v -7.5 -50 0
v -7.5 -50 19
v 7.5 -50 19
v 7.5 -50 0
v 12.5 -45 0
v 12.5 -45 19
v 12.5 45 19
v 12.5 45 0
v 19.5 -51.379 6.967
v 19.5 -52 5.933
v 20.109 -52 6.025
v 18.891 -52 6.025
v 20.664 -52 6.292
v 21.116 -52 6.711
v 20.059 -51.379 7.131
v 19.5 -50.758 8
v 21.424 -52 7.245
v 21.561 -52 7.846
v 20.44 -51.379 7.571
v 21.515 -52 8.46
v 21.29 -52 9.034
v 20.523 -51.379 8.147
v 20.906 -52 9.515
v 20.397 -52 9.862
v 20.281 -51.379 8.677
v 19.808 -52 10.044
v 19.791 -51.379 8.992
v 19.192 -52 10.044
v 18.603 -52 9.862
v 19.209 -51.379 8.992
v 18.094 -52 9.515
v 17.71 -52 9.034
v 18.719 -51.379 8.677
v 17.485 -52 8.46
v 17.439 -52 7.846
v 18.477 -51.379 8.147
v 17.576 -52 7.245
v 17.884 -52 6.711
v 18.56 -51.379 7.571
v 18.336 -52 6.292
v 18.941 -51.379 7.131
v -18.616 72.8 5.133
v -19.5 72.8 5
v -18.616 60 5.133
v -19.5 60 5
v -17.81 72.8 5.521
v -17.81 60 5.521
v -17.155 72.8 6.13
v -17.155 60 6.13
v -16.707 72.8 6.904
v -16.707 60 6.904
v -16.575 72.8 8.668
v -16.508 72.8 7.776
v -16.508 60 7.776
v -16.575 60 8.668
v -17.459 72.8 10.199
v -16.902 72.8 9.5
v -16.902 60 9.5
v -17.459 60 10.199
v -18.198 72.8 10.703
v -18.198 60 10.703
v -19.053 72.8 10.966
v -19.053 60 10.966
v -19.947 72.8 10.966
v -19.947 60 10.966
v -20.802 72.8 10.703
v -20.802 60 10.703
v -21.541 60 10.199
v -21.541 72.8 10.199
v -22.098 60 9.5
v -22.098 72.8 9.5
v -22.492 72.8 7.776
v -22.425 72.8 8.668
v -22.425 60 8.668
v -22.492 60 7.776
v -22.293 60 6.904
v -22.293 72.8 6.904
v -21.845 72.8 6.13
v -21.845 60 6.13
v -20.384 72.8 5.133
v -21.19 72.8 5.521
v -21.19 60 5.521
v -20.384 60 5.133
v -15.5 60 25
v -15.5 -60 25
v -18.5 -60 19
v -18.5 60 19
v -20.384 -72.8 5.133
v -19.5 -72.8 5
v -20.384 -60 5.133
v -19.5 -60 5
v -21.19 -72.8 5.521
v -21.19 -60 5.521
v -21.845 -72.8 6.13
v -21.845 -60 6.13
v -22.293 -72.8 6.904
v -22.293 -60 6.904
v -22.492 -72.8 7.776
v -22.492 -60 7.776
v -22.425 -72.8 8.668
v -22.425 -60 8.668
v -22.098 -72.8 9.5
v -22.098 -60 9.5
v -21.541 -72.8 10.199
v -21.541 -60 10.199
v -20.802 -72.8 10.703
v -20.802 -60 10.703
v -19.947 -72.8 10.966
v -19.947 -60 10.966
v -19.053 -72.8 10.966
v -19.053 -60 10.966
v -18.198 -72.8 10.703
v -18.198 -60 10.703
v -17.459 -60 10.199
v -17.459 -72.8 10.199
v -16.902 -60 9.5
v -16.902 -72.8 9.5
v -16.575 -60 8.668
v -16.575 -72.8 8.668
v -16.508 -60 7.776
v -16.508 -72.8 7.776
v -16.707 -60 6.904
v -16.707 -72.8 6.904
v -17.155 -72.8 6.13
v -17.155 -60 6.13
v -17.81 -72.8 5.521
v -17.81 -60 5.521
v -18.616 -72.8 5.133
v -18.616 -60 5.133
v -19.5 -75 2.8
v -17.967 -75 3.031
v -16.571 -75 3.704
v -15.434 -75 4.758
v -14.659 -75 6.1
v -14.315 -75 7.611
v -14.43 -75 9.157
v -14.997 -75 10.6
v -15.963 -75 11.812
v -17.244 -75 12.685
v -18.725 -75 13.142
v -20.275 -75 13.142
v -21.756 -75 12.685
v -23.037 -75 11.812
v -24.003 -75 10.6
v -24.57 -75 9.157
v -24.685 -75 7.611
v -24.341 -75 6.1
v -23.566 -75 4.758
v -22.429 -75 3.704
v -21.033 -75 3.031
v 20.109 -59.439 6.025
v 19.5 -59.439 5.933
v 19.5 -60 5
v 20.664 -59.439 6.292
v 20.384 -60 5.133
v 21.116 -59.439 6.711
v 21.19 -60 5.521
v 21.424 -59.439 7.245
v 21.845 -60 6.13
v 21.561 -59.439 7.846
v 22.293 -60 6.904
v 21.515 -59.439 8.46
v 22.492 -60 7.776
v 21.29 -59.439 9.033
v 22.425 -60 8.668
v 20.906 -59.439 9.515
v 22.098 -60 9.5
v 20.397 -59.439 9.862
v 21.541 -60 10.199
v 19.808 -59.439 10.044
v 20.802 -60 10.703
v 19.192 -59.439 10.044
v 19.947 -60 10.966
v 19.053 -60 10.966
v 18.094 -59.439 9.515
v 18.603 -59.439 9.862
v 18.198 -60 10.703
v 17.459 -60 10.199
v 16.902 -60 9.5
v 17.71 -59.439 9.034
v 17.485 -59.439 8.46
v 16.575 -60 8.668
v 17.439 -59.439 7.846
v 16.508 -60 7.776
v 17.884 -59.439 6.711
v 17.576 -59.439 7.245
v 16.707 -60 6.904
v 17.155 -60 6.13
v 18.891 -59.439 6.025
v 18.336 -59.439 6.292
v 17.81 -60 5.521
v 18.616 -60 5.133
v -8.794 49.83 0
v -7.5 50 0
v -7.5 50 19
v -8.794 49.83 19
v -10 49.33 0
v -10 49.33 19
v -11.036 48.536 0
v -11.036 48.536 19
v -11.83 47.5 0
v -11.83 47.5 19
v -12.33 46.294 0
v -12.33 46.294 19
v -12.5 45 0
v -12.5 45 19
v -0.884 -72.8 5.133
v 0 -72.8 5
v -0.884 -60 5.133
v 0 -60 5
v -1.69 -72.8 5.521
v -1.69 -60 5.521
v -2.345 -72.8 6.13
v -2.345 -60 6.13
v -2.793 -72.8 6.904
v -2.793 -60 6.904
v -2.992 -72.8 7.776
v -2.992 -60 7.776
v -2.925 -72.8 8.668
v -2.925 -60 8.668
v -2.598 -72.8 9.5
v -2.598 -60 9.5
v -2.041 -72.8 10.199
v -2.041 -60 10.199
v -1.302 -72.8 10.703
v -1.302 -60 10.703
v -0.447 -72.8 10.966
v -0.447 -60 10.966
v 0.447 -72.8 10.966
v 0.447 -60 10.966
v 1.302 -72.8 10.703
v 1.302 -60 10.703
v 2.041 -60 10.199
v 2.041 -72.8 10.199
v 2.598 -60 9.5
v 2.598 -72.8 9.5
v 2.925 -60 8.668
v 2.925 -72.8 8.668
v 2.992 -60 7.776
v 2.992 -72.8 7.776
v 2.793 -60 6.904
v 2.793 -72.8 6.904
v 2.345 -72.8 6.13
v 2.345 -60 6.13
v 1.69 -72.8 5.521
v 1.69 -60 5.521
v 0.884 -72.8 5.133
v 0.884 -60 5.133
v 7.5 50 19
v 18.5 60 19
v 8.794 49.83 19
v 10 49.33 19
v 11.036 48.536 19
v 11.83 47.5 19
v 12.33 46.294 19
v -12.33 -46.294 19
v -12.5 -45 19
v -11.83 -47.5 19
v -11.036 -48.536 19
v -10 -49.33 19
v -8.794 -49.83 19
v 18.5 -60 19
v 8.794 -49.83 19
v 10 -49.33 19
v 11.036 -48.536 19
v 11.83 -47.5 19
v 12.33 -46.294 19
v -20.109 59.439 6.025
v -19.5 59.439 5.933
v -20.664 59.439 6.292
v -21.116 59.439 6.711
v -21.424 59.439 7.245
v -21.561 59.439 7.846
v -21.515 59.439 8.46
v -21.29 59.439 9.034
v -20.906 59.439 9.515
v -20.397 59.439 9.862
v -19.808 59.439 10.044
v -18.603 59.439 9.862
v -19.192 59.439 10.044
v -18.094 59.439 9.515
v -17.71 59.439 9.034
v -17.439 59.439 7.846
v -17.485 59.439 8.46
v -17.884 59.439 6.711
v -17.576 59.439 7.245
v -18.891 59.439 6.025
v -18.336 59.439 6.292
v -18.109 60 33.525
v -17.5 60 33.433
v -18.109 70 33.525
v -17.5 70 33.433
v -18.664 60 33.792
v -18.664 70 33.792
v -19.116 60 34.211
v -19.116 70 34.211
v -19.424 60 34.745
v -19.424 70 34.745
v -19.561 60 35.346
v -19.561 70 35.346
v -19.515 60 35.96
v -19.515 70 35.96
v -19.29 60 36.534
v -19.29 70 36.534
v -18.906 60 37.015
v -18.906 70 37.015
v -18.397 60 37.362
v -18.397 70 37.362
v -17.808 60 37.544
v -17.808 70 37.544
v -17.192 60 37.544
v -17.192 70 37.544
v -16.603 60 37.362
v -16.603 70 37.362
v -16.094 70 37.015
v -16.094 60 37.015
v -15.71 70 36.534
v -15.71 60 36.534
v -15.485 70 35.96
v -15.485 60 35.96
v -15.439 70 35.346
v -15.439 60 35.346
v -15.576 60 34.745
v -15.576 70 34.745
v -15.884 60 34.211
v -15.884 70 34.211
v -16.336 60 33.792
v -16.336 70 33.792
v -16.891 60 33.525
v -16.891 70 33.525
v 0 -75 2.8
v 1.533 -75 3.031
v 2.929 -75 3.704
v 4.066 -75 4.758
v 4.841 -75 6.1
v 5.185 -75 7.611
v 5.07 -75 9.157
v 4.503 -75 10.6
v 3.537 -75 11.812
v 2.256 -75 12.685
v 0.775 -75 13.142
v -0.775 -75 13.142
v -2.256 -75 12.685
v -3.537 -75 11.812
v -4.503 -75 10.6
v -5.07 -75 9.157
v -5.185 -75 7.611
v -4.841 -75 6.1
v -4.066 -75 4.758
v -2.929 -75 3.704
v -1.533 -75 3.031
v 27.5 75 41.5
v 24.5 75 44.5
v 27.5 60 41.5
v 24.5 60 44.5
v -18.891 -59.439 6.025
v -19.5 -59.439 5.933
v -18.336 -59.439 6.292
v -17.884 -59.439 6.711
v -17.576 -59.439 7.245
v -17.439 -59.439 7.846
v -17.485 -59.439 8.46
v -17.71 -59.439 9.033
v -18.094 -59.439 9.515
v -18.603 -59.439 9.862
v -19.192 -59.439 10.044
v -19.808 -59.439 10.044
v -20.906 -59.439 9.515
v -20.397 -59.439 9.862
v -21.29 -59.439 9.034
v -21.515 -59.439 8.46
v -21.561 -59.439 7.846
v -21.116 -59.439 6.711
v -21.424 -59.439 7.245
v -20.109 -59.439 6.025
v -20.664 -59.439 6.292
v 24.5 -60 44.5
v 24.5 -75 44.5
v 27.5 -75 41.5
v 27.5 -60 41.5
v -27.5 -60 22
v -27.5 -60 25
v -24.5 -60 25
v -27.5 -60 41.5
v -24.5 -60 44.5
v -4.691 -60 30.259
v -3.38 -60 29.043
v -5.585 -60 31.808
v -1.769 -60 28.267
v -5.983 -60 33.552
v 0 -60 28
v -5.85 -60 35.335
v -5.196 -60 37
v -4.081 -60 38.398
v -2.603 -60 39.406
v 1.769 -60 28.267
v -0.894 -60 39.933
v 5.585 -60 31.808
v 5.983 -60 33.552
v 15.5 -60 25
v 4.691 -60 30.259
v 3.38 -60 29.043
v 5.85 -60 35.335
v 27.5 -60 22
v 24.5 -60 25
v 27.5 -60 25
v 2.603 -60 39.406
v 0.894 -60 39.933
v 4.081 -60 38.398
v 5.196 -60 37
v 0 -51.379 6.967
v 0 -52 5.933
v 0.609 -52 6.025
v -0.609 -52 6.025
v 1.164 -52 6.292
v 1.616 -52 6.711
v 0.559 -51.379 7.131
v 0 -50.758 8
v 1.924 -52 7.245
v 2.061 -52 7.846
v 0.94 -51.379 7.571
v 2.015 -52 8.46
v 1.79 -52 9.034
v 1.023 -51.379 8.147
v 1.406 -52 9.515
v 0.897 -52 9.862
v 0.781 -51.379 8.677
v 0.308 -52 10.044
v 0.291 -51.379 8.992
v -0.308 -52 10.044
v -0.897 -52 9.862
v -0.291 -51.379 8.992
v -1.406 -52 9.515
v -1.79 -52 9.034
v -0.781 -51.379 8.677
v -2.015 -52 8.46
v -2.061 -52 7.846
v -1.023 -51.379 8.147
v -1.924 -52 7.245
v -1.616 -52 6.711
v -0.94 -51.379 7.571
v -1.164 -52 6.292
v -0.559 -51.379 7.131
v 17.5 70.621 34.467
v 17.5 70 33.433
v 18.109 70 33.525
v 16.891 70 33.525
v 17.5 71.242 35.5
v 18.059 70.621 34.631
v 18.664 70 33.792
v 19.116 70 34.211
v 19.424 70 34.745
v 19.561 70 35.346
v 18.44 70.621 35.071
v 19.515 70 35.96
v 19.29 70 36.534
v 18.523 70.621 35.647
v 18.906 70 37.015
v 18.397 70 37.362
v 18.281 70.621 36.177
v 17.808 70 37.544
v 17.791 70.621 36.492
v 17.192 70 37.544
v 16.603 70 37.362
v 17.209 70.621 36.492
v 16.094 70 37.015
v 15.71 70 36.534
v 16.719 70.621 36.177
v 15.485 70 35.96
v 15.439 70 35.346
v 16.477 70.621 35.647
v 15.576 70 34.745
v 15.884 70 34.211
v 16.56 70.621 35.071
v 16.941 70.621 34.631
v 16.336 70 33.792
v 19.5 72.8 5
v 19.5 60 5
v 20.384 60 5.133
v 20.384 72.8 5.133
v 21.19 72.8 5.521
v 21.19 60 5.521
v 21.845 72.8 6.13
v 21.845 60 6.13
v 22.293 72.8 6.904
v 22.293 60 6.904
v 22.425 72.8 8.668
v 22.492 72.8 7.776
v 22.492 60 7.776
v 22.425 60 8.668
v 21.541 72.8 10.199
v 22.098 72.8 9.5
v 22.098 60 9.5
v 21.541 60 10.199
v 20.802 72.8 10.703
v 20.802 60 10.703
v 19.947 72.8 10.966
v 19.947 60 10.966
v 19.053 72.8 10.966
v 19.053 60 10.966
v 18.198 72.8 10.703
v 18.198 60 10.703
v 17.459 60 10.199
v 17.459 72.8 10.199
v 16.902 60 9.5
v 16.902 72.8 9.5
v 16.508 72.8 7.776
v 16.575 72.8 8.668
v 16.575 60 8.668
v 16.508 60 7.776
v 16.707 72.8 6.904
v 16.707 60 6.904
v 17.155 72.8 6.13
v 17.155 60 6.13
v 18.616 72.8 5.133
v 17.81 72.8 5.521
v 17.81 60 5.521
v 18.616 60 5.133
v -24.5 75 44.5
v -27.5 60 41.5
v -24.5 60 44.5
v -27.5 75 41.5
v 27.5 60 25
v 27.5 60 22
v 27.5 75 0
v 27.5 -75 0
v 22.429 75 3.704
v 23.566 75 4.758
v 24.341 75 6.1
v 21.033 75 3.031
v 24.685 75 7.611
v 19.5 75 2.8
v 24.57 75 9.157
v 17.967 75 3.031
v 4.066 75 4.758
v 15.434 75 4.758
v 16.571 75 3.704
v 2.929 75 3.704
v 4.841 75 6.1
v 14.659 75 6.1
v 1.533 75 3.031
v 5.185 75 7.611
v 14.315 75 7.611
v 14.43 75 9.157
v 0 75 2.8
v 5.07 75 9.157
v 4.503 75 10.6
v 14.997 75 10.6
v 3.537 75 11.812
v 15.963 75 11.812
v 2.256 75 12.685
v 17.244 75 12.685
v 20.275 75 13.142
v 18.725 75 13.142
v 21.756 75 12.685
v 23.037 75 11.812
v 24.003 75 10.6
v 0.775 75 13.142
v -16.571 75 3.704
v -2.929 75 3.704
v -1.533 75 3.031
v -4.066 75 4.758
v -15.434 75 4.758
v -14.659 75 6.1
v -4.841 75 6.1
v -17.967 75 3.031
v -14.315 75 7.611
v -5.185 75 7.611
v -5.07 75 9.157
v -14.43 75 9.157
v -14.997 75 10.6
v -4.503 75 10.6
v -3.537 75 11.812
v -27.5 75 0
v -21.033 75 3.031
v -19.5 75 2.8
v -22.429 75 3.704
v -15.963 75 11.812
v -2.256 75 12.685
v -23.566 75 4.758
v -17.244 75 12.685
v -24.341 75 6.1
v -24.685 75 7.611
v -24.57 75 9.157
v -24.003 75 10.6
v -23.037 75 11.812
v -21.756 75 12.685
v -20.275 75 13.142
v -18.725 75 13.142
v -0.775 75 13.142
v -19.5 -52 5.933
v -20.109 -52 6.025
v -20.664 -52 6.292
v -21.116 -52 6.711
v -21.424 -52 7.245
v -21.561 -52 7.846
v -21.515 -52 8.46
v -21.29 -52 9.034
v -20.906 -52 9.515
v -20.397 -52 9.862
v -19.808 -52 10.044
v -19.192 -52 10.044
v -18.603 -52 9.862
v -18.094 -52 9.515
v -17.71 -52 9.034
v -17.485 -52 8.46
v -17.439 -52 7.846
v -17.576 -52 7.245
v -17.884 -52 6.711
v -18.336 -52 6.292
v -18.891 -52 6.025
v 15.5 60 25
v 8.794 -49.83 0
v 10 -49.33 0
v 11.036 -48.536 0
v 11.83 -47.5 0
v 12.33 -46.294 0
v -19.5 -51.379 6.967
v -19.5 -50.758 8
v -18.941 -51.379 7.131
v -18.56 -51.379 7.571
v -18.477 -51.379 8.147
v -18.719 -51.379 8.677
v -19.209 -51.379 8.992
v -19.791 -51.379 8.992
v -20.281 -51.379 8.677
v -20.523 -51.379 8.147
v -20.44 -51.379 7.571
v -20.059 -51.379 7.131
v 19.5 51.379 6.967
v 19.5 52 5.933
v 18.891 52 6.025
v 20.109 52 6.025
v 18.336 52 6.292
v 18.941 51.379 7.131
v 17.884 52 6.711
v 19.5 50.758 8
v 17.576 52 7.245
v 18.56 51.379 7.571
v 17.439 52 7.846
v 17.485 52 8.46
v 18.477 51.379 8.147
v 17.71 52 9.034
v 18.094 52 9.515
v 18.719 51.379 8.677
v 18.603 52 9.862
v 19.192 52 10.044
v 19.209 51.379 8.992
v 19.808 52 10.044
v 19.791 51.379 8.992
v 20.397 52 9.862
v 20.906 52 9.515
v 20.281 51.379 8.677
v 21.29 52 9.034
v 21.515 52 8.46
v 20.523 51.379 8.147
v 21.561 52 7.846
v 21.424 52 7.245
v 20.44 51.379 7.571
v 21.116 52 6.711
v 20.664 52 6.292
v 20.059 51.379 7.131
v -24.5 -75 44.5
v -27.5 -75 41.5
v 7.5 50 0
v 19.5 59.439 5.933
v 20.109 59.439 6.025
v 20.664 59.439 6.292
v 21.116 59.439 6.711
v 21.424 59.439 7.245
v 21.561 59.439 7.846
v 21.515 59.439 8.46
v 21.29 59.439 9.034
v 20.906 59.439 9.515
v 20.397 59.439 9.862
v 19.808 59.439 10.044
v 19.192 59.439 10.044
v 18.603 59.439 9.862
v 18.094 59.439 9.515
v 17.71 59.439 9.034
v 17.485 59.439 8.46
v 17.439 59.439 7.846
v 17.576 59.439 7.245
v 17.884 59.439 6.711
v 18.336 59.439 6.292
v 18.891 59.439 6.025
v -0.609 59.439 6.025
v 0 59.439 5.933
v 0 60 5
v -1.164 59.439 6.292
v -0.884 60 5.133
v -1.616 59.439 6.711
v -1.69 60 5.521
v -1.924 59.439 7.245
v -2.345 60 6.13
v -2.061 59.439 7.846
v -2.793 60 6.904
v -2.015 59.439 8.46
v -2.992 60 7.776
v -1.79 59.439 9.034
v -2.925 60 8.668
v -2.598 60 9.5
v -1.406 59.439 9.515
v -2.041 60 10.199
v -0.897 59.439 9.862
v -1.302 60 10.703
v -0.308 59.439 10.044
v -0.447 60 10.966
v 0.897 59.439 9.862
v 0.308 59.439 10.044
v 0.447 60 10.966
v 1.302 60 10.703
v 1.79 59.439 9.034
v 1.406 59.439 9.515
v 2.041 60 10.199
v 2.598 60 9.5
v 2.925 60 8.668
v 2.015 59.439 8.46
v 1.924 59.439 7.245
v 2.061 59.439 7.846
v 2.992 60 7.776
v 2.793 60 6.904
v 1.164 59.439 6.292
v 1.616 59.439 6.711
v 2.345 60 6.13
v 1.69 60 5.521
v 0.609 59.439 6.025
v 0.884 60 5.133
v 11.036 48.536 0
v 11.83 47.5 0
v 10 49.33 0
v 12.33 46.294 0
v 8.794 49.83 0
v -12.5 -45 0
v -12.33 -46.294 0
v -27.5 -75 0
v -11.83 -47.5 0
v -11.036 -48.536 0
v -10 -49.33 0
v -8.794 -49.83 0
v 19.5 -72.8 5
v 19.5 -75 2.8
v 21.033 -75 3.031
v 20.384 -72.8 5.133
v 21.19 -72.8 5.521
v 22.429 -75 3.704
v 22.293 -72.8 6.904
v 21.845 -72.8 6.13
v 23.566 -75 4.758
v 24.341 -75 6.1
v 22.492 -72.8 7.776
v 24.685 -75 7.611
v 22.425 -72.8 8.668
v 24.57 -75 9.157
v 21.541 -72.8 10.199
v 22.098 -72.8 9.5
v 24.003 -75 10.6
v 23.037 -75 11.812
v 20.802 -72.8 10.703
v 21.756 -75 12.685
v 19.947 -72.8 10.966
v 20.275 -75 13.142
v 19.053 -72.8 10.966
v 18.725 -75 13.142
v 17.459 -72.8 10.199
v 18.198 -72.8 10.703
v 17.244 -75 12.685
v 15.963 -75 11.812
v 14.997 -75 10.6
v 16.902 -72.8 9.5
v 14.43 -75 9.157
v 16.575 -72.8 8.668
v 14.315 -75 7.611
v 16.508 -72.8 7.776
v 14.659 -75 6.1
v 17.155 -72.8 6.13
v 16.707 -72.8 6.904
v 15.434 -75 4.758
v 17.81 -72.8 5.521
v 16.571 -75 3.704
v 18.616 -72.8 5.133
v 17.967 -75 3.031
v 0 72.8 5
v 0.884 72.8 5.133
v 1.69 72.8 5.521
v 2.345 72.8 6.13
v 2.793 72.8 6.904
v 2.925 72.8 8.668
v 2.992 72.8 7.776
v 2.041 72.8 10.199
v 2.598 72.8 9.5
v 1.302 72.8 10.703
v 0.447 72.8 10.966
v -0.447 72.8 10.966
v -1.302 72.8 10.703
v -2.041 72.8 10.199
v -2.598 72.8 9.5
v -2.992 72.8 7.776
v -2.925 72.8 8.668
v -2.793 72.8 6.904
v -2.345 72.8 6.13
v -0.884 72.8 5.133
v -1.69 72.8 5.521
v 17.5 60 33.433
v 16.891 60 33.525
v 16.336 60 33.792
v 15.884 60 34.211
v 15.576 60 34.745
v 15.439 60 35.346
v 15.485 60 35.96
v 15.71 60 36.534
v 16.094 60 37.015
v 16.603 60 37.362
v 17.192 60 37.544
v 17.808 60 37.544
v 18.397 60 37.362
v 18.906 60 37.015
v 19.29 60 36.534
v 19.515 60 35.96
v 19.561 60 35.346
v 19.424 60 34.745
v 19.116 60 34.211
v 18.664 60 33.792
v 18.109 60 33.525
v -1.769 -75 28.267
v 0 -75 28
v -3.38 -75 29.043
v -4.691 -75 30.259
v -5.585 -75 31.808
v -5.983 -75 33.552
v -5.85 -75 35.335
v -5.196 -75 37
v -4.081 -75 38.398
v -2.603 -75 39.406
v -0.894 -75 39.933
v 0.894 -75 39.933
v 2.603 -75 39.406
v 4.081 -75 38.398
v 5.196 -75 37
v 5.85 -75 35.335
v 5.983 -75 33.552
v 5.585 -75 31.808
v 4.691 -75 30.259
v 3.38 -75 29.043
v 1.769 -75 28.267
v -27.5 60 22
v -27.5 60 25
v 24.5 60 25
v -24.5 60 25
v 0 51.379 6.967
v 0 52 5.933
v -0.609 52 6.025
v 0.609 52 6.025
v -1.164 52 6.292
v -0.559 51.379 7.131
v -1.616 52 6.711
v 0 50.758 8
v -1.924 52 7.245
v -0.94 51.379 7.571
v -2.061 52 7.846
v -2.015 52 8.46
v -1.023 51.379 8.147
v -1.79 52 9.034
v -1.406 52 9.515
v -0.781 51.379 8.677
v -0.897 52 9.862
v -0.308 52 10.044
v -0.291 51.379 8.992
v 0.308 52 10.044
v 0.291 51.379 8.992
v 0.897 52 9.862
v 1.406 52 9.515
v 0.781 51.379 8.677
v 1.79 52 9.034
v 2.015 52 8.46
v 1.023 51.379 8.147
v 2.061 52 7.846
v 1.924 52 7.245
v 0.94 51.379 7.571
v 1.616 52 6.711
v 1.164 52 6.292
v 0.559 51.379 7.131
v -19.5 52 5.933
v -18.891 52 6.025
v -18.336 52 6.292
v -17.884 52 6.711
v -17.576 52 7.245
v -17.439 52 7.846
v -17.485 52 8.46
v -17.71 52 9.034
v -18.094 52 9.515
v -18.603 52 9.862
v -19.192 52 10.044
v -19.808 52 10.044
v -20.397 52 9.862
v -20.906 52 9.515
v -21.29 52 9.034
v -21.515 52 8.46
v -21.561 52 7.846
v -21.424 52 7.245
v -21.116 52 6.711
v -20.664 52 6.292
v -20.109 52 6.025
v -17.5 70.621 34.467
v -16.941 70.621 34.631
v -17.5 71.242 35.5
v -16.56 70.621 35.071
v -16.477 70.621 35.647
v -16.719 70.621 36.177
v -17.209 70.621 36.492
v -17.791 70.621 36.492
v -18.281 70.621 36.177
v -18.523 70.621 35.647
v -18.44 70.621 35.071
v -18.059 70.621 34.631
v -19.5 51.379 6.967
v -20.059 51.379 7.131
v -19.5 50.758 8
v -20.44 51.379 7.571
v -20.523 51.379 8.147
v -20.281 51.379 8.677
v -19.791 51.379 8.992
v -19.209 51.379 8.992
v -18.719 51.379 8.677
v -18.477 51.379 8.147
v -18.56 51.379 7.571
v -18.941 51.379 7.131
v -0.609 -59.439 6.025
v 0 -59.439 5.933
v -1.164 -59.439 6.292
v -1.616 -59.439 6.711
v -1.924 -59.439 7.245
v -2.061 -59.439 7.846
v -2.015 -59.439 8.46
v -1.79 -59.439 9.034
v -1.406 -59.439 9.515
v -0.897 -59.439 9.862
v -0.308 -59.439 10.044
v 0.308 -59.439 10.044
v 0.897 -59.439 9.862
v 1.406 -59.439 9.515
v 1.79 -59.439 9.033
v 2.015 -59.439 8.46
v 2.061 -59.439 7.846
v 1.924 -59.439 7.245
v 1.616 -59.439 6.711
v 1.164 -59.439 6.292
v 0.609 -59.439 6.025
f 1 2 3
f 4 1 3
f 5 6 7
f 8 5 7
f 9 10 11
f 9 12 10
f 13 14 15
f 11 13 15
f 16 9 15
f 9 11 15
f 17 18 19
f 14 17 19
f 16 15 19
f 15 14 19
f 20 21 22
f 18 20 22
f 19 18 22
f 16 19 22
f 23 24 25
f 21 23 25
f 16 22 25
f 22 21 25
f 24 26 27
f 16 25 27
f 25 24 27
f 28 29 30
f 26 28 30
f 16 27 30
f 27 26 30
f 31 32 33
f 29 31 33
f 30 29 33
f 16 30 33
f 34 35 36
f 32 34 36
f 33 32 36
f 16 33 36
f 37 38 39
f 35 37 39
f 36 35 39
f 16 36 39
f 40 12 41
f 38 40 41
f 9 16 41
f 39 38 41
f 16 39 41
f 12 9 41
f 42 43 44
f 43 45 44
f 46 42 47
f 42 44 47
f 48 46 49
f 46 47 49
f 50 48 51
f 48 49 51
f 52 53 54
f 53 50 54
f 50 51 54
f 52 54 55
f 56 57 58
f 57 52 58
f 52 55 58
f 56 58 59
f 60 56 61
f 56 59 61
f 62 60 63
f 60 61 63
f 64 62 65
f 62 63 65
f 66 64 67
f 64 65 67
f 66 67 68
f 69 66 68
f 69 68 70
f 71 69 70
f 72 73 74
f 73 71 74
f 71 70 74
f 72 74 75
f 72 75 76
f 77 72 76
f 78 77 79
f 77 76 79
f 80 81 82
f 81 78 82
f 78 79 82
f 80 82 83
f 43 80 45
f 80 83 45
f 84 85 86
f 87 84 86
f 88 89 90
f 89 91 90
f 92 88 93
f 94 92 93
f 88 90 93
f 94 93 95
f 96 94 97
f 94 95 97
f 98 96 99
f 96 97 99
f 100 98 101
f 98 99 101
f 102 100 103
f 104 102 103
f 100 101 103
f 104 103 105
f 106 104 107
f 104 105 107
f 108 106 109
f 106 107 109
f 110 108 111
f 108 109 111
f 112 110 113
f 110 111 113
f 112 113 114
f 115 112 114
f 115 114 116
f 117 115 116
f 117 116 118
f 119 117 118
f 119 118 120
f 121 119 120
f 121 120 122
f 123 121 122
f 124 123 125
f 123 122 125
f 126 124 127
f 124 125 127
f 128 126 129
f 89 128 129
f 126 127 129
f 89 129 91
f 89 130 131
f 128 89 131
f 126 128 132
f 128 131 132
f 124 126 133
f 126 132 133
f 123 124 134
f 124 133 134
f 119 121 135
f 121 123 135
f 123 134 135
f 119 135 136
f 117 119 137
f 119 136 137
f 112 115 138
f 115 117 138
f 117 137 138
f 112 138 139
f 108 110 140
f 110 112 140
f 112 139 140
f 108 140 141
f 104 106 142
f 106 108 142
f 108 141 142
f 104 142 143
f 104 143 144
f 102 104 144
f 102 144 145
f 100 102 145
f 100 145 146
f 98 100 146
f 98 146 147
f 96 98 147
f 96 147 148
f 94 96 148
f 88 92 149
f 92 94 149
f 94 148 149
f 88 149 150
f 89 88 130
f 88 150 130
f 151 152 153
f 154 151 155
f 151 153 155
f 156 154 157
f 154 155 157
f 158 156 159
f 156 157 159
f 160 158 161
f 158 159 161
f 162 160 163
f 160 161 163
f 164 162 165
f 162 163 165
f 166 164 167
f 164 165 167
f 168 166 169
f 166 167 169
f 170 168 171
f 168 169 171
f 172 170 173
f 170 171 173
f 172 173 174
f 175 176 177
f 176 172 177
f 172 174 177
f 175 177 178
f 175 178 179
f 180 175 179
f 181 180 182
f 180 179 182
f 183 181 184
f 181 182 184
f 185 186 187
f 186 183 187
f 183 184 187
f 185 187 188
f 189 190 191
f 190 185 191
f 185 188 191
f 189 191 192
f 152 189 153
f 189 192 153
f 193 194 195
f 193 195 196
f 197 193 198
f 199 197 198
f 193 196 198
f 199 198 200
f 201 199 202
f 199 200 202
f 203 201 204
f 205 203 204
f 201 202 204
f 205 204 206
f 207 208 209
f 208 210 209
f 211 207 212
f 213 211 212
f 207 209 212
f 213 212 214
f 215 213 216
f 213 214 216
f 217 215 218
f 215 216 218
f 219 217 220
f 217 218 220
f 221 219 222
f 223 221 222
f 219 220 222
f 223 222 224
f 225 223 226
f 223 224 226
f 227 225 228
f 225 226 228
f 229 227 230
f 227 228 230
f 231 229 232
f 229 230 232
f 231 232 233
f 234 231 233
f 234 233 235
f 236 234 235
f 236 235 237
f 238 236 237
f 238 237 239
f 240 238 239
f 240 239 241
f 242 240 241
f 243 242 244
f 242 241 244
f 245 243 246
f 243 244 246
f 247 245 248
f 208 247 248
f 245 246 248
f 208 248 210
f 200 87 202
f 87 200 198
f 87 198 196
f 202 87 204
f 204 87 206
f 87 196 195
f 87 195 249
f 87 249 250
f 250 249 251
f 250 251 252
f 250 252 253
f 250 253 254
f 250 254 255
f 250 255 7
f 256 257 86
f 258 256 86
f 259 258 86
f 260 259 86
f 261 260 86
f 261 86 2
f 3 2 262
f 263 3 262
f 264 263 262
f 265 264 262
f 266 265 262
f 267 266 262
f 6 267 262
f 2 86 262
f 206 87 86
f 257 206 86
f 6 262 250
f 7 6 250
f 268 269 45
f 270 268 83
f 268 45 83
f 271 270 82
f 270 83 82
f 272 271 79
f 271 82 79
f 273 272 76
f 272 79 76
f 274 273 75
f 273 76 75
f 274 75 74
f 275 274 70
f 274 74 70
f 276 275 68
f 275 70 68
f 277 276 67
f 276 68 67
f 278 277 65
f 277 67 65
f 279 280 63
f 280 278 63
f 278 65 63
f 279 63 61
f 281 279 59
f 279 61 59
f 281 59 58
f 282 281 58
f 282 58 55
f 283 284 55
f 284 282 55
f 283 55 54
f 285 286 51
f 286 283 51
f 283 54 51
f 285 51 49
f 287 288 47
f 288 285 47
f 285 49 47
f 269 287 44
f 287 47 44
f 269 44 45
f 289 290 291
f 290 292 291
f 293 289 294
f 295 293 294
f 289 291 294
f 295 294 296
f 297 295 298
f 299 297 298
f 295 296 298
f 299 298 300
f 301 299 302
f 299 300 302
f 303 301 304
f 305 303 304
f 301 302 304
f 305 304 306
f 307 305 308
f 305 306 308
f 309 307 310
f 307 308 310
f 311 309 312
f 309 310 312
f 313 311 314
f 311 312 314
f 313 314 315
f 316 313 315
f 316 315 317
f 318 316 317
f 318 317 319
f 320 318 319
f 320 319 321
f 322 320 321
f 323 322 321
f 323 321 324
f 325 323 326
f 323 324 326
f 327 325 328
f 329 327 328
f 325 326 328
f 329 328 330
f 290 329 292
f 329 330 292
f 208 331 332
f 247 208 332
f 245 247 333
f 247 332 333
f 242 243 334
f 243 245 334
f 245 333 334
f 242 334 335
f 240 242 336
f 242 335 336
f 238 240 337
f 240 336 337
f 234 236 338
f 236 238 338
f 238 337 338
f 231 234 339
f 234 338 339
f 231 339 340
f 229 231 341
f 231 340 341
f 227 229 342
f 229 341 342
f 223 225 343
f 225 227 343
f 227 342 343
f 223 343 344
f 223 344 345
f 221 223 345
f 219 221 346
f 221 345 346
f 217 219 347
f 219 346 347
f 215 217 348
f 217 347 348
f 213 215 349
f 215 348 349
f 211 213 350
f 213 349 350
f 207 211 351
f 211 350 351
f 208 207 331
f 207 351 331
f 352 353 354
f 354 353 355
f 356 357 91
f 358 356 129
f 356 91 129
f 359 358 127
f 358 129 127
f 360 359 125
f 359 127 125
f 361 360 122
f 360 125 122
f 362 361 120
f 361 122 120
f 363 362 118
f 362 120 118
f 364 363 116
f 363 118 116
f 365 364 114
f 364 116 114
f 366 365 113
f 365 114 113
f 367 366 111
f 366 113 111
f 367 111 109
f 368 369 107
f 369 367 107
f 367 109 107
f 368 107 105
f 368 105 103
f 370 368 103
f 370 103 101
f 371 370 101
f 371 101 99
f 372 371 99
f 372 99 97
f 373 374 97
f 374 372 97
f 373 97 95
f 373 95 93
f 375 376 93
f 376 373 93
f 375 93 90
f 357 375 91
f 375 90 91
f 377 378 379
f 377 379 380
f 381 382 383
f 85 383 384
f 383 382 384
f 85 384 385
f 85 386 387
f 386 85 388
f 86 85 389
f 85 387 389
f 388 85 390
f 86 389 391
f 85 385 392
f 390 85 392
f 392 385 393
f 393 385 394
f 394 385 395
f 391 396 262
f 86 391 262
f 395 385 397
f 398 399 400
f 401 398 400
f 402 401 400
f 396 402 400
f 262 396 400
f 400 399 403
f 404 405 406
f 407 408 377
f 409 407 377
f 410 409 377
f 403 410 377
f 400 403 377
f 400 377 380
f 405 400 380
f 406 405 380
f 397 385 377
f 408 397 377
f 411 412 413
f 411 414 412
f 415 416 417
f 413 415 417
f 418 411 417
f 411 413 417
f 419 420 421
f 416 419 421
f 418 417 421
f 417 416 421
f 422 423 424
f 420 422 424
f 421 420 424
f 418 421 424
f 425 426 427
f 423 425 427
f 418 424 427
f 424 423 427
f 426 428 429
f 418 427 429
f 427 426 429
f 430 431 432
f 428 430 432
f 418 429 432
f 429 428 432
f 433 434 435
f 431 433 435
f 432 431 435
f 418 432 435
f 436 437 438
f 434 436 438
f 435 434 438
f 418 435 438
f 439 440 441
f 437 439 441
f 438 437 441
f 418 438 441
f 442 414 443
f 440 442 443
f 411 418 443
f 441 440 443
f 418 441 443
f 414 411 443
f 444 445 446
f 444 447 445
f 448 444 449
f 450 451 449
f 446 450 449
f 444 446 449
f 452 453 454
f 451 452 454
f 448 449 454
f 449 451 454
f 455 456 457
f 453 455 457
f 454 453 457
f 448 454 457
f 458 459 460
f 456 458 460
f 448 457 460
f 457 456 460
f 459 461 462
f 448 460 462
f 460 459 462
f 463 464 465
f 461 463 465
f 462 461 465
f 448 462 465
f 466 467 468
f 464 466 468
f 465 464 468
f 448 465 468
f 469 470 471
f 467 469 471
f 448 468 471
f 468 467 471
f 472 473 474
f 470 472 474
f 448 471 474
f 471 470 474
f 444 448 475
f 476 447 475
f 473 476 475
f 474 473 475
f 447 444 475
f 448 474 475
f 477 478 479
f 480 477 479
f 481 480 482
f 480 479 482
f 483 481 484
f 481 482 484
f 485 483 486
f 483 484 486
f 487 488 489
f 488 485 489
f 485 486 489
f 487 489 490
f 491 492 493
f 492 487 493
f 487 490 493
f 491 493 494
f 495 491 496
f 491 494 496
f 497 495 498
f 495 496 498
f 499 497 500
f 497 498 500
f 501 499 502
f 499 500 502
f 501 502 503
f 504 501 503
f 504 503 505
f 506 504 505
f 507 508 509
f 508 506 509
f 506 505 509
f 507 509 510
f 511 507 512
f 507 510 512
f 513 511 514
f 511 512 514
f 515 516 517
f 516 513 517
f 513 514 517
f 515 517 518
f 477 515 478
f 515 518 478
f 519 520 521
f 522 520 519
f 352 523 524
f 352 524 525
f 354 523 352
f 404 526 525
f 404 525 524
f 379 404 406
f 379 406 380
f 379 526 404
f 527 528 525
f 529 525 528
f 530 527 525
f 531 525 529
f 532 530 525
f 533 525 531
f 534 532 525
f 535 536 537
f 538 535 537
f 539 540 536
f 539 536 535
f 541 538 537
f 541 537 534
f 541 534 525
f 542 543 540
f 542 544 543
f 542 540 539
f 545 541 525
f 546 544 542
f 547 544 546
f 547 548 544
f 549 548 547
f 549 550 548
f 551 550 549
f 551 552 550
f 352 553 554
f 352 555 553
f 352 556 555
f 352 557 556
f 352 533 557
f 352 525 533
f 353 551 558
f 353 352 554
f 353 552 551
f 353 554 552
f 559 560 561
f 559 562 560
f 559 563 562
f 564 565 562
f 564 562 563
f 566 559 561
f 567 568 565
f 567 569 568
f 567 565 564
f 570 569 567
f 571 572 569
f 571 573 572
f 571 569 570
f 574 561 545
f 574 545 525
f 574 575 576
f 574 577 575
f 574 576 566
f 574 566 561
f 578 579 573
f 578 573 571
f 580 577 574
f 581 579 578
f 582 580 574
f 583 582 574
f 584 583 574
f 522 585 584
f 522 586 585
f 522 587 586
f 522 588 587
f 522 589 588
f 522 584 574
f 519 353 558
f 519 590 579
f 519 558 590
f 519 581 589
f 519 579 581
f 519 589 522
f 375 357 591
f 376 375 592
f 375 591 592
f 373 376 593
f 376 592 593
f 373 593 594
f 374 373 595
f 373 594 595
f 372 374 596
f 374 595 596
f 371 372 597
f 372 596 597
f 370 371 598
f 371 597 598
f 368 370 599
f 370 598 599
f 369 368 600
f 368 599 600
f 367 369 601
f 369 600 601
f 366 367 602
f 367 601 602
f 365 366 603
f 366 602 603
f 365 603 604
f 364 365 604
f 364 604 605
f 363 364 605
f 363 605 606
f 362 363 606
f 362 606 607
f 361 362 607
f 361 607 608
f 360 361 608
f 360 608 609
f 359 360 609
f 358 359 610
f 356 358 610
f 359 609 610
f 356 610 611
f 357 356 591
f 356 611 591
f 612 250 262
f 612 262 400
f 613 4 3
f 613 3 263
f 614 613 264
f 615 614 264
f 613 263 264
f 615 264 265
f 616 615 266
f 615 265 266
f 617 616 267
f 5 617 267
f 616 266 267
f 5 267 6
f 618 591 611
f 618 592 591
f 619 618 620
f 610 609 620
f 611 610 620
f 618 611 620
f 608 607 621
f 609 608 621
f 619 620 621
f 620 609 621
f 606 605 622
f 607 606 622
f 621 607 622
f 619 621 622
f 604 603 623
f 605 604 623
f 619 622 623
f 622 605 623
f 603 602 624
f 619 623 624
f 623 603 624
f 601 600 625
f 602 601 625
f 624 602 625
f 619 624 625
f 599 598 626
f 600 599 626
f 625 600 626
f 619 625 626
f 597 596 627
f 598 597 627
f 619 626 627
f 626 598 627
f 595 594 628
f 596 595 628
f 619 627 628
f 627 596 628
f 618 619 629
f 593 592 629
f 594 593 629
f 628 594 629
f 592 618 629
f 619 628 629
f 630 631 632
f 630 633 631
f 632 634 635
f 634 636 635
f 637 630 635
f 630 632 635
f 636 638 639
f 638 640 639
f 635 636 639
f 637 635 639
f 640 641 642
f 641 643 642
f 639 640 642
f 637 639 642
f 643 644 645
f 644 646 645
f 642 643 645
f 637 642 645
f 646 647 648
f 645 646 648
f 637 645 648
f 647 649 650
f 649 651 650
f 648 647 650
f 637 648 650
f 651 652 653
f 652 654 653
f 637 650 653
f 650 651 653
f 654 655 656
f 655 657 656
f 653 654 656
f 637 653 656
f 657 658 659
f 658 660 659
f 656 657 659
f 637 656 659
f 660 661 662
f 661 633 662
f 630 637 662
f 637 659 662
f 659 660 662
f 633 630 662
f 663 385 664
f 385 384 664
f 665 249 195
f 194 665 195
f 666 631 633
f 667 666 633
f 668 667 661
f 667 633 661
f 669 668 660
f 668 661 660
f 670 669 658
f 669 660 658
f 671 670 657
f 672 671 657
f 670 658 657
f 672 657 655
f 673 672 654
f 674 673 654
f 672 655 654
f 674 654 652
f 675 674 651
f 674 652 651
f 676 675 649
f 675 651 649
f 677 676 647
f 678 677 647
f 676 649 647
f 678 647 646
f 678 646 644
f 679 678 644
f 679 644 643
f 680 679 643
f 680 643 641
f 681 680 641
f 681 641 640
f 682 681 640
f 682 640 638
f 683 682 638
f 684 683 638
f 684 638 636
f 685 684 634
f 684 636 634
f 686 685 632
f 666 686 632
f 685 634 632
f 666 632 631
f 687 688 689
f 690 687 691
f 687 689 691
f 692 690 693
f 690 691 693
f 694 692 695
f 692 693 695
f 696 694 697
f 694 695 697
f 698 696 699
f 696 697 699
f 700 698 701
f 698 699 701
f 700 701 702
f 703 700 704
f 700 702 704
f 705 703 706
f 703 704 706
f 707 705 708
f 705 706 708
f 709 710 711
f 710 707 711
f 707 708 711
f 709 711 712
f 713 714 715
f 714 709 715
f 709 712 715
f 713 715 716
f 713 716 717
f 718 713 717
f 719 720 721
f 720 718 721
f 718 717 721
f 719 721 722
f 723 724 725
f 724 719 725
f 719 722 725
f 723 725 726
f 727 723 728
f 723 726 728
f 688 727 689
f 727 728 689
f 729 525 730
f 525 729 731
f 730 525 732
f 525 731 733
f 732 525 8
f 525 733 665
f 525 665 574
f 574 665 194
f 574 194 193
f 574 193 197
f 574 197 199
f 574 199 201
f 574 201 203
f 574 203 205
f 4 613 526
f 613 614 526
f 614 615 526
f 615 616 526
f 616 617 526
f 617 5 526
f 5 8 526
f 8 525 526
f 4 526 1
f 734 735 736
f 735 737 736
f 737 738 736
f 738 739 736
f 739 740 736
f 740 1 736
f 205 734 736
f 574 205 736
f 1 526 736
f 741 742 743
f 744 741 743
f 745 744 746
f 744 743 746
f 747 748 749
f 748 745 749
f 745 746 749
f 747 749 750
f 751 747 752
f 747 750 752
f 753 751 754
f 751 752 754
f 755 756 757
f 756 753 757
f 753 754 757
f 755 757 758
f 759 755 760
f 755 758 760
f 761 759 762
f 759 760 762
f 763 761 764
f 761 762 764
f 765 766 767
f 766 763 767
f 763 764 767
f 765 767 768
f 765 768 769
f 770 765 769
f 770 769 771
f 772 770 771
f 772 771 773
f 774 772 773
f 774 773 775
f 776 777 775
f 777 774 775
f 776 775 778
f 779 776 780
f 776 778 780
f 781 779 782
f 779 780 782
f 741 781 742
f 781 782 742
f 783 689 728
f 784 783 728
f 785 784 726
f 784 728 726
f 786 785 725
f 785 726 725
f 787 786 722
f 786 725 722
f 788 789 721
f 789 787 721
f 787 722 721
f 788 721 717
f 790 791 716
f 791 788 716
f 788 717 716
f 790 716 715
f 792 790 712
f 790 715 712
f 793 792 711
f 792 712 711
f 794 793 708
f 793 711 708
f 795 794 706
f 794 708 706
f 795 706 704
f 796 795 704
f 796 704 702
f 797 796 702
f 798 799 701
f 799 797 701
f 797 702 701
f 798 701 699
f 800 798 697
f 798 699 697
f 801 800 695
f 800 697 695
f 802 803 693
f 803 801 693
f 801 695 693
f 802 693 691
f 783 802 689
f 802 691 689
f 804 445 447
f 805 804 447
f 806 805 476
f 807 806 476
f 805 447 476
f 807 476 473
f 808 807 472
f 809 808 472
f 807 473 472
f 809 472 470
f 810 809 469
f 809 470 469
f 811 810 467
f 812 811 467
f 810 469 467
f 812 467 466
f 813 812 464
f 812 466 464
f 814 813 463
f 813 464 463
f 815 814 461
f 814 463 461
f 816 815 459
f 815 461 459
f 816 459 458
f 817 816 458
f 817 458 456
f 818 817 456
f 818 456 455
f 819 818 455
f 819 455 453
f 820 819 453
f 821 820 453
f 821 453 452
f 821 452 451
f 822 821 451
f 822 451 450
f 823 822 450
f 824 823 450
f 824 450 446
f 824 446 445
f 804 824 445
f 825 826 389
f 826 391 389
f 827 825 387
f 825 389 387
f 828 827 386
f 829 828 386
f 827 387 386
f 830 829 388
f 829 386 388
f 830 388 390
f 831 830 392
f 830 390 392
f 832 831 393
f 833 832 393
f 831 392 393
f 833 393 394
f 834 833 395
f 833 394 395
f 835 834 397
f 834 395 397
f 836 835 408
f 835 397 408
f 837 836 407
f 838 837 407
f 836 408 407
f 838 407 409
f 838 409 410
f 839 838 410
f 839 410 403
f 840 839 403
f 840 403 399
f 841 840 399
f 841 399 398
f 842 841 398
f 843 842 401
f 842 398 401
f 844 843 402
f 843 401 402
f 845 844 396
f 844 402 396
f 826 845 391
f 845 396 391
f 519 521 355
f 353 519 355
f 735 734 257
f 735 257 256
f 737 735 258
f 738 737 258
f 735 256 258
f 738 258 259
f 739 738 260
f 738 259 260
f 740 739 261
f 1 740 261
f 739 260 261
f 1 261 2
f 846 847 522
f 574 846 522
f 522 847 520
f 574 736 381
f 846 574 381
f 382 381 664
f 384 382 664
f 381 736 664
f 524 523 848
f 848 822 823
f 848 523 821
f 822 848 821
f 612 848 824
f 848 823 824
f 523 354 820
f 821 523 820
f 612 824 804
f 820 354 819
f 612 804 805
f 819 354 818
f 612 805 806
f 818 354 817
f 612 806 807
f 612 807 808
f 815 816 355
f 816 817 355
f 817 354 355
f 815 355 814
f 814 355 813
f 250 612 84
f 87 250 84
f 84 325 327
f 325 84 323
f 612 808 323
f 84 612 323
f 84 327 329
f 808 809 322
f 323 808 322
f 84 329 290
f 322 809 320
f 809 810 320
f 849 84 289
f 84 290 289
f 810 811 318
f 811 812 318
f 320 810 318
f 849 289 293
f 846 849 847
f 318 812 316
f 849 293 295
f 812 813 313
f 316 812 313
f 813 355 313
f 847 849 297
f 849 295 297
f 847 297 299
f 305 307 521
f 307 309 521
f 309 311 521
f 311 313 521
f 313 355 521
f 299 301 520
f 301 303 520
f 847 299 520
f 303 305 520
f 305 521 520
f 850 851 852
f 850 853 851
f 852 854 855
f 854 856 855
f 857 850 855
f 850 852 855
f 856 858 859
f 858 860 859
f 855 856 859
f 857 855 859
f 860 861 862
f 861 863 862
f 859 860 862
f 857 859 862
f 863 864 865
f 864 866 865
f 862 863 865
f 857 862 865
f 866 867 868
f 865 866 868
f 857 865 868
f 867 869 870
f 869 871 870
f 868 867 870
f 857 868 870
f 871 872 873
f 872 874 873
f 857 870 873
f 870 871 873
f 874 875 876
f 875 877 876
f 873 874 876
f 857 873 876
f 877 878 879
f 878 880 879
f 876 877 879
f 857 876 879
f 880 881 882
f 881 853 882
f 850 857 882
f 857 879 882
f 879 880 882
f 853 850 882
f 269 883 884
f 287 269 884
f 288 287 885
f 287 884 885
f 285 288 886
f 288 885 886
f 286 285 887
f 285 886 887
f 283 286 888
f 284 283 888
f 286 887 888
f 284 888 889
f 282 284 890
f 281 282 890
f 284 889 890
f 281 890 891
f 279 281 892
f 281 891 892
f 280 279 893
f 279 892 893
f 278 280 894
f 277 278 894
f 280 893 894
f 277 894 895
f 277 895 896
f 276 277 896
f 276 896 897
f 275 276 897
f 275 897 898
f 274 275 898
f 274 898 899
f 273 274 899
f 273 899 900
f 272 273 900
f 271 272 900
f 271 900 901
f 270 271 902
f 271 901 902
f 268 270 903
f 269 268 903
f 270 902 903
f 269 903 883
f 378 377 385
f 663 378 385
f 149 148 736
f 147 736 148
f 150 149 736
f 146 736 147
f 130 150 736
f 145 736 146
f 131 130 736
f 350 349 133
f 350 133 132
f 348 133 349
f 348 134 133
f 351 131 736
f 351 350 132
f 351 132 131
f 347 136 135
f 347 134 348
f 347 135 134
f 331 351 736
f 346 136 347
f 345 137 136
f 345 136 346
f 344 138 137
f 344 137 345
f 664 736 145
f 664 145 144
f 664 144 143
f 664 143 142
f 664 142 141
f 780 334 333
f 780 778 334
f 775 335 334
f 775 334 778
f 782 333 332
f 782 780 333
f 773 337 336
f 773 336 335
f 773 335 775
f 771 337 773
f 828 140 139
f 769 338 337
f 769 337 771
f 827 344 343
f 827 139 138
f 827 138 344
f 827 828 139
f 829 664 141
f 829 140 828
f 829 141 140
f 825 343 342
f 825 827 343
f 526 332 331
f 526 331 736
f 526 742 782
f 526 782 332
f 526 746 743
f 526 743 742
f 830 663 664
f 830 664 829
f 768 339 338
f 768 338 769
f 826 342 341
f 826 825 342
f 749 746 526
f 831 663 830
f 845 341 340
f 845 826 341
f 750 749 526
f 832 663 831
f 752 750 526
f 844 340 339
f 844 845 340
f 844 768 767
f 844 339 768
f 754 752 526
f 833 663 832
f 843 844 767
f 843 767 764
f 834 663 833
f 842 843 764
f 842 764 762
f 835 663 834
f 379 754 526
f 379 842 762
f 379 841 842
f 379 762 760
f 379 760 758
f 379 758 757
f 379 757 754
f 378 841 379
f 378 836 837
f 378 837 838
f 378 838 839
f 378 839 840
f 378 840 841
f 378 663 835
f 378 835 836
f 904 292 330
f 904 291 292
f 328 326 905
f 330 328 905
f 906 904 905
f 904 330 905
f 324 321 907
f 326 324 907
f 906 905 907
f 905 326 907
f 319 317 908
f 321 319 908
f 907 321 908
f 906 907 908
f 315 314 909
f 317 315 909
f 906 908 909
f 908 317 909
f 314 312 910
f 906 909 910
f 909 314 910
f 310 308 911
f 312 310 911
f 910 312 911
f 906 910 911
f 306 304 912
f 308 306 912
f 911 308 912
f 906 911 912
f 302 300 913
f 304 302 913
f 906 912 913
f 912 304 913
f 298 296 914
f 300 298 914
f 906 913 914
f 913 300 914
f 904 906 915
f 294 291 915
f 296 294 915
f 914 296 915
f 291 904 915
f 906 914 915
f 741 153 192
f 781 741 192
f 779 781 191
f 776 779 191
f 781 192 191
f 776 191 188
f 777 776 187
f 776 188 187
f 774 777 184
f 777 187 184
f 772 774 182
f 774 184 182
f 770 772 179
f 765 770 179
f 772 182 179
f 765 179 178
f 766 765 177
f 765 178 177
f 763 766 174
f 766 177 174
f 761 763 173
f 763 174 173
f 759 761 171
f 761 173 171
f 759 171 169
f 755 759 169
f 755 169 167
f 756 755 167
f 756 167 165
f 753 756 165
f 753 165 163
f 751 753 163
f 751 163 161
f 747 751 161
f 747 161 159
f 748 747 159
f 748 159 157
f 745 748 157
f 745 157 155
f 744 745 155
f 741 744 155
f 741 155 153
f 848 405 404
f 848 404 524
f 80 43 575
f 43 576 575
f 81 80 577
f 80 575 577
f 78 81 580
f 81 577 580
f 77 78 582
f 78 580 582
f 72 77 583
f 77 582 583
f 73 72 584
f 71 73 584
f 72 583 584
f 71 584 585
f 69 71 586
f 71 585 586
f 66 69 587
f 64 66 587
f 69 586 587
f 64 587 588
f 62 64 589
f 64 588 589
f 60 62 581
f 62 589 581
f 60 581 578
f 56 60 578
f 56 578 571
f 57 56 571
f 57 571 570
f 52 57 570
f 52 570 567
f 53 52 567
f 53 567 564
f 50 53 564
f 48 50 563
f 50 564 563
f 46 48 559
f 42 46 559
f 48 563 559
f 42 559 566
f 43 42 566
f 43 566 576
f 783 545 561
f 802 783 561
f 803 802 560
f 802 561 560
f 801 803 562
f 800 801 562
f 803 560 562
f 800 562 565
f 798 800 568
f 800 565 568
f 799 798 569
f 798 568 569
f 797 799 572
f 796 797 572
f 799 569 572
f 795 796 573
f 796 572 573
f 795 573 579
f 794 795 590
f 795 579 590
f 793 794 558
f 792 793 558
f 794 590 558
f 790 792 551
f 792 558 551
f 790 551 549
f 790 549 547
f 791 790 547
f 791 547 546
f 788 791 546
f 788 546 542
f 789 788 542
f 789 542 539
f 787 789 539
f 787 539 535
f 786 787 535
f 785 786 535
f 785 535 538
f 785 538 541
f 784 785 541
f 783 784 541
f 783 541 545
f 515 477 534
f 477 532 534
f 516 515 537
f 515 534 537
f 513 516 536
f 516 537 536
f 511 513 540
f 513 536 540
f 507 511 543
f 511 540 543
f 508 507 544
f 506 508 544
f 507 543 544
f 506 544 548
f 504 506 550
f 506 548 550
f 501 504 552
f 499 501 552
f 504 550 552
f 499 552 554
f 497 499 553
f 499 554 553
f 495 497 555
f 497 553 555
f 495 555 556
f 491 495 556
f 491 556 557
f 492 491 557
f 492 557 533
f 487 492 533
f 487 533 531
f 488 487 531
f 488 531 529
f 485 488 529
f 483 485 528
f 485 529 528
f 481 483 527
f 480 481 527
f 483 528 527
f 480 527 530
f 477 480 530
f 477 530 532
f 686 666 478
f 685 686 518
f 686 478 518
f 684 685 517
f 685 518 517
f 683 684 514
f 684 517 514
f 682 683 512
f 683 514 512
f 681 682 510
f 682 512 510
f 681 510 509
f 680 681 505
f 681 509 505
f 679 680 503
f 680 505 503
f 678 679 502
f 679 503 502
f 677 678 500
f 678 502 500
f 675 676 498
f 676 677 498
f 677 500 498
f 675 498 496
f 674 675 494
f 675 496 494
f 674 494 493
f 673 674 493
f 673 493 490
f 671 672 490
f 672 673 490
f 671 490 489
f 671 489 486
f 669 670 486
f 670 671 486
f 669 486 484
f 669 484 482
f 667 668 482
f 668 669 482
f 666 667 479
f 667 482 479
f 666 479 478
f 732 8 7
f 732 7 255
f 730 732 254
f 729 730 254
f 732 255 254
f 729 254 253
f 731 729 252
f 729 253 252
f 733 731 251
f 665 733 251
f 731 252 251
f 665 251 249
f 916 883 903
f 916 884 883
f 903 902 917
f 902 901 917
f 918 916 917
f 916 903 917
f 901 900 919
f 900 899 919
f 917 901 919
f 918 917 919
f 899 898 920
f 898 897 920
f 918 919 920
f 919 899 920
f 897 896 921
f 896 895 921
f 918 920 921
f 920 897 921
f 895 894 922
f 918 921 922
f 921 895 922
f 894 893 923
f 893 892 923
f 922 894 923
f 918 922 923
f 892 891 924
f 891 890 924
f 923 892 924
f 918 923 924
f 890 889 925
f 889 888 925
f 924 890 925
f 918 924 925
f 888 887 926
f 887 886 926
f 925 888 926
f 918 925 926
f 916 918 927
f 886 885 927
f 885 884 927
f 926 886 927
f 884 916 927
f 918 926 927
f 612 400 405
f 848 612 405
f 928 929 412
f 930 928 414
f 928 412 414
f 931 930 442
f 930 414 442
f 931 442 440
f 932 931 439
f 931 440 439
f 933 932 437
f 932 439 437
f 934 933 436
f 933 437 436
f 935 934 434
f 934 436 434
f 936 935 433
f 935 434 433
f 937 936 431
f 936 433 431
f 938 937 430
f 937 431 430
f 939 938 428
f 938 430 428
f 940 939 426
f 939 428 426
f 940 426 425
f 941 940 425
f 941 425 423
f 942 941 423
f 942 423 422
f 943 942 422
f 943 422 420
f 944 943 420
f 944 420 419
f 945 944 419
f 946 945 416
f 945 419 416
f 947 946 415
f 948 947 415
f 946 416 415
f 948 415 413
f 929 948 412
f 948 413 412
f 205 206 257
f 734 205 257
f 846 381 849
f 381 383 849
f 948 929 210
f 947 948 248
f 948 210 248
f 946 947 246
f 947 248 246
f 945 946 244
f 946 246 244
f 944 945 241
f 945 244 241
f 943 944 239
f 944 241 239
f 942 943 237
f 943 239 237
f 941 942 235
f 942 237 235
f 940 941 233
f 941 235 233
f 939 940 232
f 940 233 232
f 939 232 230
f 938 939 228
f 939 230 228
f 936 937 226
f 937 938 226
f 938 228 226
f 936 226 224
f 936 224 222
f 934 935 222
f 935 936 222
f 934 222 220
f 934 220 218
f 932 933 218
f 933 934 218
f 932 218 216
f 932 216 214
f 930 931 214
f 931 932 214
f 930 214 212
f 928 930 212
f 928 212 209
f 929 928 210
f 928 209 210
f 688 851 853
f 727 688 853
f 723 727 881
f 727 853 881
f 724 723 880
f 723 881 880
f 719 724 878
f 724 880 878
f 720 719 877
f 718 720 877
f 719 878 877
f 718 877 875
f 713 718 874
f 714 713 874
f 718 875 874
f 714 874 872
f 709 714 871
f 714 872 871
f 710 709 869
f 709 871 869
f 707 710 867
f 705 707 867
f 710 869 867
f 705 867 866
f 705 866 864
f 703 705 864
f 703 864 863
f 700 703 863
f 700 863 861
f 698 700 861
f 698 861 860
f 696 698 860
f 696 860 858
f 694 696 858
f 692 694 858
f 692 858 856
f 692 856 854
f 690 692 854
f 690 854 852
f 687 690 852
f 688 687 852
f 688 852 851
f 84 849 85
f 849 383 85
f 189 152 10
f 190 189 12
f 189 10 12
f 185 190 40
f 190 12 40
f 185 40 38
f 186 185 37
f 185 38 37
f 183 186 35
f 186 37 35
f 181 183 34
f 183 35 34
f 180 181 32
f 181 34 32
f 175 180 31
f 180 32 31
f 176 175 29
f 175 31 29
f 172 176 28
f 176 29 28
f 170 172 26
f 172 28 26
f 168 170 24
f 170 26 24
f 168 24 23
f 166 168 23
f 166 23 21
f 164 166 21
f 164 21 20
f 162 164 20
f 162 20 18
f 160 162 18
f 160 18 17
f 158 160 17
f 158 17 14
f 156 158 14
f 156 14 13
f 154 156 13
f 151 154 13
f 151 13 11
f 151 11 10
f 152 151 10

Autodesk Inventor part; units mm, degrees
ref_plane "YZ Plane" through (0, 0, 0) normal (1, 0, 0) x (0, 1, 0)
ref_plane "XZ Plane" through (0, 0, 0) normal (0, 1, 0) x (-1, 0, 0)
ref_plane "XY Plane" through (0, 0, 0) normal (0, 0, 1) x (1, 0, 0)
sketch "Sketch1" plane through (0, 0, -12.5) normal (0, 1, 0) x (-1, 0, 0)
  line L0 (-27.5, 12.5) -> (27.5, 12.5)
  line L1 (27.5, 12.5) -> (27.5, 37.5)
  line L2 (27.5, 37.5) -> (15.5, 37.5)
  line L3 (15.5, 37.5) -> (18.5, 31.5)
  line L4 (18.5, 31.5) -> (-18.5, 31.5)
  line L5 (-18.5, 31.5) -> (-15.5, 37.5)
  line L6 (-15.5, 37.5) -> (-27.5, 37.5)
  line L7 (-27.5, 37.5) -> (-27.5, 12.5)
  line L8 (0, 7.5) -> (0, 42.5) projected
  line L9 (-38.5, 12.5) -> (38.5, 12.5) projected
  point P0 (0, 12.5)
  point P1 (0, 12.5)
  dimension "Base_Width" = 55
  dimension "Base_Height" = 25
  dimension "Slider_Shelf" = 12
  dimension "d3" = 9
  dimension "d2" = 6
extrude "Extrusion1" add sketch "Sketch1" along normal mid plane 120
sketch "Sketch4" plane through (-18.5, 60, 19) normal (0, 0, 1) x (1, 0, 0)
  line L0 (11, -110) -> (26, -110)
  line L1 (31, -105) -> (31, -15)
  line L2 (26, -10) -> (11, -10)
  line L3 (6, -15) -> (6, -105)
  arc A0 (6, -105) -> (11, -110) centre (11, -105) ccw
  arc A1 (26, -110) -> (31, -105) centre (26, -105) ccw
  arc A2 (31, -15) -> (26, -10) centre (26, -15) ccw
  arc A3 (11, -10) -> (6, -15) centre (11, -15) ccw
  line L4 (-20, -60) -> (57, -60) projected
  line L5 (18.5, 24) -> (18.5, -144) projected
  line L6 (-9, -120) -> (-9, 0) projected
  line L7 (37, 0) -> (0, 0) projected
  dimension "StopPlate_DP" = 5
  dimension "d25" = 100
  dimension "d26" = 25
extrude "Extrusion2" cut sketch "Sketch4" against normal through all
sketch "Sketch6" plane through (0, -60, -12.5) normal (0, -1, 0) x (1, 0, 0)
  line L0 (27.5, 37.5) -> (27.5, 12.5) projected
  line L1 (-27.5, 12.5) -> (27.5, 12.5)
  line L2 (27.5, 12.5) -> (27.5, 57)
  line L3 (27.5, 57) -> (-27.5, 57)
  line L4 (-27.5, 57) -> (-27.5, 12.5)
  point P0 (0, 12.5)
  dimension "EndBlock_HT" = 44.5
extrude "Extrusion4" add sketch "Sketch6" along normal blind 15
mirror "Mirror1" about plane through (0, 0, 0) normal (0, 1, 0) of "Extrusion4"
sketch "Sketch7" plane through (0, -75, -12.5) normal (0, -1, 0) x (1, 0, 0)
  line L0 (-27.5, 57) -> (27.5, 57) projected
  line L1 (0, 65.9) -> (0, 3.6) projected
  point P0 (0, 12.5)
  point P1 (0, 46.5)
  dimension "d39" = 10.5
hole "Hole1" at (0, -75, 34) direction (0, 1, 0) diameter 12 depth 75
sketch "Sketch14" plane through (0, -75, -12.5) normal (0, -1, 0) x (1, 0, 0)
  line L0 (27.5, 12.5) -> (-27.5, 12.5) projected
  line L1 (0, 65.9) -> (0, 3.6) projected
  point P0 (0, 12.5)
  point P1 (0, 20.5)
  dimension "d83" = 8
hole "Hole5" at (0, -75, 8) direction (0, 1, 0) diameter 6 depth 15 tip angle 118 countersink diameter 10.4 countersink angle 90
sketch "Sketch9" plane through (0, -60, -12.5) normal (0, -1, 0) x (1, 0, 0)
  circle A0 centre (0, 20.5) radius 5.2 projected
  point P0 (0, 12.5)
hole "Hole3" at (0, -60, 8) direction (0, 1, 0) diameter 4.134 depth 8 tip angle 118 thread size "M5x0.8" class "6H" standard "ANSI Metric M Profile"
pattern_linear "Rectangular Pattern2" count 3 spacing 19.5 along (-1, 0, 0) of "Hole3", "Hole5" first direction both ways yes
mirror "Mirror2" about plane through (0, 0, 0) normal (0, 1, 0) of "Hole3", "Rectangular Pattern2", "Hole5"
sketch "Sketch11" plane through (-27.5, 60, 44.5) normal (0, -1, 0) x (1, 0, 0)
  line L0 (0, 0) -> (55, 0) projected
  line L1 (0, -44.5) -> (0, 0) projected
  line L2 (55, 0) -> (55, -44.5) projected
  point P0 (27.5, -44.5)
  point P1 (10, -9)
  point P2 (45, -9)
  dimension "d103" = 9
  dimension "d104" = 10
  dimension "d105" = 10
hole "Hole6" at (-17.5, 60, 35.5) at (17.5, 60, 35.5) direction (0, 1, 0) diameter 4.134 depth 10 tip angle 118 thread size "M5x0.8" class "6H" standard "ANSI Metric M Profile"
thread "Thread1" size "M12x1.75" class "6H" standard "ANSI Metric M Profile" full length
chamfer "Chamfer1" distance 3 angle 45 6 edges at (-27.5, -67.5, 44.5) (27.5, -67.5, 44.5) (27.5, 67.5, 44.5) (-27.5, 67.5, 44.5) (27.5, 0, 25) (-27.5, 0, 25)
equation "\"d89\" = EndBlock_DP"
equation "\"d104\" = d105"
equation "\"EndBlock_DP\" = 15"
properties part number "Base"
